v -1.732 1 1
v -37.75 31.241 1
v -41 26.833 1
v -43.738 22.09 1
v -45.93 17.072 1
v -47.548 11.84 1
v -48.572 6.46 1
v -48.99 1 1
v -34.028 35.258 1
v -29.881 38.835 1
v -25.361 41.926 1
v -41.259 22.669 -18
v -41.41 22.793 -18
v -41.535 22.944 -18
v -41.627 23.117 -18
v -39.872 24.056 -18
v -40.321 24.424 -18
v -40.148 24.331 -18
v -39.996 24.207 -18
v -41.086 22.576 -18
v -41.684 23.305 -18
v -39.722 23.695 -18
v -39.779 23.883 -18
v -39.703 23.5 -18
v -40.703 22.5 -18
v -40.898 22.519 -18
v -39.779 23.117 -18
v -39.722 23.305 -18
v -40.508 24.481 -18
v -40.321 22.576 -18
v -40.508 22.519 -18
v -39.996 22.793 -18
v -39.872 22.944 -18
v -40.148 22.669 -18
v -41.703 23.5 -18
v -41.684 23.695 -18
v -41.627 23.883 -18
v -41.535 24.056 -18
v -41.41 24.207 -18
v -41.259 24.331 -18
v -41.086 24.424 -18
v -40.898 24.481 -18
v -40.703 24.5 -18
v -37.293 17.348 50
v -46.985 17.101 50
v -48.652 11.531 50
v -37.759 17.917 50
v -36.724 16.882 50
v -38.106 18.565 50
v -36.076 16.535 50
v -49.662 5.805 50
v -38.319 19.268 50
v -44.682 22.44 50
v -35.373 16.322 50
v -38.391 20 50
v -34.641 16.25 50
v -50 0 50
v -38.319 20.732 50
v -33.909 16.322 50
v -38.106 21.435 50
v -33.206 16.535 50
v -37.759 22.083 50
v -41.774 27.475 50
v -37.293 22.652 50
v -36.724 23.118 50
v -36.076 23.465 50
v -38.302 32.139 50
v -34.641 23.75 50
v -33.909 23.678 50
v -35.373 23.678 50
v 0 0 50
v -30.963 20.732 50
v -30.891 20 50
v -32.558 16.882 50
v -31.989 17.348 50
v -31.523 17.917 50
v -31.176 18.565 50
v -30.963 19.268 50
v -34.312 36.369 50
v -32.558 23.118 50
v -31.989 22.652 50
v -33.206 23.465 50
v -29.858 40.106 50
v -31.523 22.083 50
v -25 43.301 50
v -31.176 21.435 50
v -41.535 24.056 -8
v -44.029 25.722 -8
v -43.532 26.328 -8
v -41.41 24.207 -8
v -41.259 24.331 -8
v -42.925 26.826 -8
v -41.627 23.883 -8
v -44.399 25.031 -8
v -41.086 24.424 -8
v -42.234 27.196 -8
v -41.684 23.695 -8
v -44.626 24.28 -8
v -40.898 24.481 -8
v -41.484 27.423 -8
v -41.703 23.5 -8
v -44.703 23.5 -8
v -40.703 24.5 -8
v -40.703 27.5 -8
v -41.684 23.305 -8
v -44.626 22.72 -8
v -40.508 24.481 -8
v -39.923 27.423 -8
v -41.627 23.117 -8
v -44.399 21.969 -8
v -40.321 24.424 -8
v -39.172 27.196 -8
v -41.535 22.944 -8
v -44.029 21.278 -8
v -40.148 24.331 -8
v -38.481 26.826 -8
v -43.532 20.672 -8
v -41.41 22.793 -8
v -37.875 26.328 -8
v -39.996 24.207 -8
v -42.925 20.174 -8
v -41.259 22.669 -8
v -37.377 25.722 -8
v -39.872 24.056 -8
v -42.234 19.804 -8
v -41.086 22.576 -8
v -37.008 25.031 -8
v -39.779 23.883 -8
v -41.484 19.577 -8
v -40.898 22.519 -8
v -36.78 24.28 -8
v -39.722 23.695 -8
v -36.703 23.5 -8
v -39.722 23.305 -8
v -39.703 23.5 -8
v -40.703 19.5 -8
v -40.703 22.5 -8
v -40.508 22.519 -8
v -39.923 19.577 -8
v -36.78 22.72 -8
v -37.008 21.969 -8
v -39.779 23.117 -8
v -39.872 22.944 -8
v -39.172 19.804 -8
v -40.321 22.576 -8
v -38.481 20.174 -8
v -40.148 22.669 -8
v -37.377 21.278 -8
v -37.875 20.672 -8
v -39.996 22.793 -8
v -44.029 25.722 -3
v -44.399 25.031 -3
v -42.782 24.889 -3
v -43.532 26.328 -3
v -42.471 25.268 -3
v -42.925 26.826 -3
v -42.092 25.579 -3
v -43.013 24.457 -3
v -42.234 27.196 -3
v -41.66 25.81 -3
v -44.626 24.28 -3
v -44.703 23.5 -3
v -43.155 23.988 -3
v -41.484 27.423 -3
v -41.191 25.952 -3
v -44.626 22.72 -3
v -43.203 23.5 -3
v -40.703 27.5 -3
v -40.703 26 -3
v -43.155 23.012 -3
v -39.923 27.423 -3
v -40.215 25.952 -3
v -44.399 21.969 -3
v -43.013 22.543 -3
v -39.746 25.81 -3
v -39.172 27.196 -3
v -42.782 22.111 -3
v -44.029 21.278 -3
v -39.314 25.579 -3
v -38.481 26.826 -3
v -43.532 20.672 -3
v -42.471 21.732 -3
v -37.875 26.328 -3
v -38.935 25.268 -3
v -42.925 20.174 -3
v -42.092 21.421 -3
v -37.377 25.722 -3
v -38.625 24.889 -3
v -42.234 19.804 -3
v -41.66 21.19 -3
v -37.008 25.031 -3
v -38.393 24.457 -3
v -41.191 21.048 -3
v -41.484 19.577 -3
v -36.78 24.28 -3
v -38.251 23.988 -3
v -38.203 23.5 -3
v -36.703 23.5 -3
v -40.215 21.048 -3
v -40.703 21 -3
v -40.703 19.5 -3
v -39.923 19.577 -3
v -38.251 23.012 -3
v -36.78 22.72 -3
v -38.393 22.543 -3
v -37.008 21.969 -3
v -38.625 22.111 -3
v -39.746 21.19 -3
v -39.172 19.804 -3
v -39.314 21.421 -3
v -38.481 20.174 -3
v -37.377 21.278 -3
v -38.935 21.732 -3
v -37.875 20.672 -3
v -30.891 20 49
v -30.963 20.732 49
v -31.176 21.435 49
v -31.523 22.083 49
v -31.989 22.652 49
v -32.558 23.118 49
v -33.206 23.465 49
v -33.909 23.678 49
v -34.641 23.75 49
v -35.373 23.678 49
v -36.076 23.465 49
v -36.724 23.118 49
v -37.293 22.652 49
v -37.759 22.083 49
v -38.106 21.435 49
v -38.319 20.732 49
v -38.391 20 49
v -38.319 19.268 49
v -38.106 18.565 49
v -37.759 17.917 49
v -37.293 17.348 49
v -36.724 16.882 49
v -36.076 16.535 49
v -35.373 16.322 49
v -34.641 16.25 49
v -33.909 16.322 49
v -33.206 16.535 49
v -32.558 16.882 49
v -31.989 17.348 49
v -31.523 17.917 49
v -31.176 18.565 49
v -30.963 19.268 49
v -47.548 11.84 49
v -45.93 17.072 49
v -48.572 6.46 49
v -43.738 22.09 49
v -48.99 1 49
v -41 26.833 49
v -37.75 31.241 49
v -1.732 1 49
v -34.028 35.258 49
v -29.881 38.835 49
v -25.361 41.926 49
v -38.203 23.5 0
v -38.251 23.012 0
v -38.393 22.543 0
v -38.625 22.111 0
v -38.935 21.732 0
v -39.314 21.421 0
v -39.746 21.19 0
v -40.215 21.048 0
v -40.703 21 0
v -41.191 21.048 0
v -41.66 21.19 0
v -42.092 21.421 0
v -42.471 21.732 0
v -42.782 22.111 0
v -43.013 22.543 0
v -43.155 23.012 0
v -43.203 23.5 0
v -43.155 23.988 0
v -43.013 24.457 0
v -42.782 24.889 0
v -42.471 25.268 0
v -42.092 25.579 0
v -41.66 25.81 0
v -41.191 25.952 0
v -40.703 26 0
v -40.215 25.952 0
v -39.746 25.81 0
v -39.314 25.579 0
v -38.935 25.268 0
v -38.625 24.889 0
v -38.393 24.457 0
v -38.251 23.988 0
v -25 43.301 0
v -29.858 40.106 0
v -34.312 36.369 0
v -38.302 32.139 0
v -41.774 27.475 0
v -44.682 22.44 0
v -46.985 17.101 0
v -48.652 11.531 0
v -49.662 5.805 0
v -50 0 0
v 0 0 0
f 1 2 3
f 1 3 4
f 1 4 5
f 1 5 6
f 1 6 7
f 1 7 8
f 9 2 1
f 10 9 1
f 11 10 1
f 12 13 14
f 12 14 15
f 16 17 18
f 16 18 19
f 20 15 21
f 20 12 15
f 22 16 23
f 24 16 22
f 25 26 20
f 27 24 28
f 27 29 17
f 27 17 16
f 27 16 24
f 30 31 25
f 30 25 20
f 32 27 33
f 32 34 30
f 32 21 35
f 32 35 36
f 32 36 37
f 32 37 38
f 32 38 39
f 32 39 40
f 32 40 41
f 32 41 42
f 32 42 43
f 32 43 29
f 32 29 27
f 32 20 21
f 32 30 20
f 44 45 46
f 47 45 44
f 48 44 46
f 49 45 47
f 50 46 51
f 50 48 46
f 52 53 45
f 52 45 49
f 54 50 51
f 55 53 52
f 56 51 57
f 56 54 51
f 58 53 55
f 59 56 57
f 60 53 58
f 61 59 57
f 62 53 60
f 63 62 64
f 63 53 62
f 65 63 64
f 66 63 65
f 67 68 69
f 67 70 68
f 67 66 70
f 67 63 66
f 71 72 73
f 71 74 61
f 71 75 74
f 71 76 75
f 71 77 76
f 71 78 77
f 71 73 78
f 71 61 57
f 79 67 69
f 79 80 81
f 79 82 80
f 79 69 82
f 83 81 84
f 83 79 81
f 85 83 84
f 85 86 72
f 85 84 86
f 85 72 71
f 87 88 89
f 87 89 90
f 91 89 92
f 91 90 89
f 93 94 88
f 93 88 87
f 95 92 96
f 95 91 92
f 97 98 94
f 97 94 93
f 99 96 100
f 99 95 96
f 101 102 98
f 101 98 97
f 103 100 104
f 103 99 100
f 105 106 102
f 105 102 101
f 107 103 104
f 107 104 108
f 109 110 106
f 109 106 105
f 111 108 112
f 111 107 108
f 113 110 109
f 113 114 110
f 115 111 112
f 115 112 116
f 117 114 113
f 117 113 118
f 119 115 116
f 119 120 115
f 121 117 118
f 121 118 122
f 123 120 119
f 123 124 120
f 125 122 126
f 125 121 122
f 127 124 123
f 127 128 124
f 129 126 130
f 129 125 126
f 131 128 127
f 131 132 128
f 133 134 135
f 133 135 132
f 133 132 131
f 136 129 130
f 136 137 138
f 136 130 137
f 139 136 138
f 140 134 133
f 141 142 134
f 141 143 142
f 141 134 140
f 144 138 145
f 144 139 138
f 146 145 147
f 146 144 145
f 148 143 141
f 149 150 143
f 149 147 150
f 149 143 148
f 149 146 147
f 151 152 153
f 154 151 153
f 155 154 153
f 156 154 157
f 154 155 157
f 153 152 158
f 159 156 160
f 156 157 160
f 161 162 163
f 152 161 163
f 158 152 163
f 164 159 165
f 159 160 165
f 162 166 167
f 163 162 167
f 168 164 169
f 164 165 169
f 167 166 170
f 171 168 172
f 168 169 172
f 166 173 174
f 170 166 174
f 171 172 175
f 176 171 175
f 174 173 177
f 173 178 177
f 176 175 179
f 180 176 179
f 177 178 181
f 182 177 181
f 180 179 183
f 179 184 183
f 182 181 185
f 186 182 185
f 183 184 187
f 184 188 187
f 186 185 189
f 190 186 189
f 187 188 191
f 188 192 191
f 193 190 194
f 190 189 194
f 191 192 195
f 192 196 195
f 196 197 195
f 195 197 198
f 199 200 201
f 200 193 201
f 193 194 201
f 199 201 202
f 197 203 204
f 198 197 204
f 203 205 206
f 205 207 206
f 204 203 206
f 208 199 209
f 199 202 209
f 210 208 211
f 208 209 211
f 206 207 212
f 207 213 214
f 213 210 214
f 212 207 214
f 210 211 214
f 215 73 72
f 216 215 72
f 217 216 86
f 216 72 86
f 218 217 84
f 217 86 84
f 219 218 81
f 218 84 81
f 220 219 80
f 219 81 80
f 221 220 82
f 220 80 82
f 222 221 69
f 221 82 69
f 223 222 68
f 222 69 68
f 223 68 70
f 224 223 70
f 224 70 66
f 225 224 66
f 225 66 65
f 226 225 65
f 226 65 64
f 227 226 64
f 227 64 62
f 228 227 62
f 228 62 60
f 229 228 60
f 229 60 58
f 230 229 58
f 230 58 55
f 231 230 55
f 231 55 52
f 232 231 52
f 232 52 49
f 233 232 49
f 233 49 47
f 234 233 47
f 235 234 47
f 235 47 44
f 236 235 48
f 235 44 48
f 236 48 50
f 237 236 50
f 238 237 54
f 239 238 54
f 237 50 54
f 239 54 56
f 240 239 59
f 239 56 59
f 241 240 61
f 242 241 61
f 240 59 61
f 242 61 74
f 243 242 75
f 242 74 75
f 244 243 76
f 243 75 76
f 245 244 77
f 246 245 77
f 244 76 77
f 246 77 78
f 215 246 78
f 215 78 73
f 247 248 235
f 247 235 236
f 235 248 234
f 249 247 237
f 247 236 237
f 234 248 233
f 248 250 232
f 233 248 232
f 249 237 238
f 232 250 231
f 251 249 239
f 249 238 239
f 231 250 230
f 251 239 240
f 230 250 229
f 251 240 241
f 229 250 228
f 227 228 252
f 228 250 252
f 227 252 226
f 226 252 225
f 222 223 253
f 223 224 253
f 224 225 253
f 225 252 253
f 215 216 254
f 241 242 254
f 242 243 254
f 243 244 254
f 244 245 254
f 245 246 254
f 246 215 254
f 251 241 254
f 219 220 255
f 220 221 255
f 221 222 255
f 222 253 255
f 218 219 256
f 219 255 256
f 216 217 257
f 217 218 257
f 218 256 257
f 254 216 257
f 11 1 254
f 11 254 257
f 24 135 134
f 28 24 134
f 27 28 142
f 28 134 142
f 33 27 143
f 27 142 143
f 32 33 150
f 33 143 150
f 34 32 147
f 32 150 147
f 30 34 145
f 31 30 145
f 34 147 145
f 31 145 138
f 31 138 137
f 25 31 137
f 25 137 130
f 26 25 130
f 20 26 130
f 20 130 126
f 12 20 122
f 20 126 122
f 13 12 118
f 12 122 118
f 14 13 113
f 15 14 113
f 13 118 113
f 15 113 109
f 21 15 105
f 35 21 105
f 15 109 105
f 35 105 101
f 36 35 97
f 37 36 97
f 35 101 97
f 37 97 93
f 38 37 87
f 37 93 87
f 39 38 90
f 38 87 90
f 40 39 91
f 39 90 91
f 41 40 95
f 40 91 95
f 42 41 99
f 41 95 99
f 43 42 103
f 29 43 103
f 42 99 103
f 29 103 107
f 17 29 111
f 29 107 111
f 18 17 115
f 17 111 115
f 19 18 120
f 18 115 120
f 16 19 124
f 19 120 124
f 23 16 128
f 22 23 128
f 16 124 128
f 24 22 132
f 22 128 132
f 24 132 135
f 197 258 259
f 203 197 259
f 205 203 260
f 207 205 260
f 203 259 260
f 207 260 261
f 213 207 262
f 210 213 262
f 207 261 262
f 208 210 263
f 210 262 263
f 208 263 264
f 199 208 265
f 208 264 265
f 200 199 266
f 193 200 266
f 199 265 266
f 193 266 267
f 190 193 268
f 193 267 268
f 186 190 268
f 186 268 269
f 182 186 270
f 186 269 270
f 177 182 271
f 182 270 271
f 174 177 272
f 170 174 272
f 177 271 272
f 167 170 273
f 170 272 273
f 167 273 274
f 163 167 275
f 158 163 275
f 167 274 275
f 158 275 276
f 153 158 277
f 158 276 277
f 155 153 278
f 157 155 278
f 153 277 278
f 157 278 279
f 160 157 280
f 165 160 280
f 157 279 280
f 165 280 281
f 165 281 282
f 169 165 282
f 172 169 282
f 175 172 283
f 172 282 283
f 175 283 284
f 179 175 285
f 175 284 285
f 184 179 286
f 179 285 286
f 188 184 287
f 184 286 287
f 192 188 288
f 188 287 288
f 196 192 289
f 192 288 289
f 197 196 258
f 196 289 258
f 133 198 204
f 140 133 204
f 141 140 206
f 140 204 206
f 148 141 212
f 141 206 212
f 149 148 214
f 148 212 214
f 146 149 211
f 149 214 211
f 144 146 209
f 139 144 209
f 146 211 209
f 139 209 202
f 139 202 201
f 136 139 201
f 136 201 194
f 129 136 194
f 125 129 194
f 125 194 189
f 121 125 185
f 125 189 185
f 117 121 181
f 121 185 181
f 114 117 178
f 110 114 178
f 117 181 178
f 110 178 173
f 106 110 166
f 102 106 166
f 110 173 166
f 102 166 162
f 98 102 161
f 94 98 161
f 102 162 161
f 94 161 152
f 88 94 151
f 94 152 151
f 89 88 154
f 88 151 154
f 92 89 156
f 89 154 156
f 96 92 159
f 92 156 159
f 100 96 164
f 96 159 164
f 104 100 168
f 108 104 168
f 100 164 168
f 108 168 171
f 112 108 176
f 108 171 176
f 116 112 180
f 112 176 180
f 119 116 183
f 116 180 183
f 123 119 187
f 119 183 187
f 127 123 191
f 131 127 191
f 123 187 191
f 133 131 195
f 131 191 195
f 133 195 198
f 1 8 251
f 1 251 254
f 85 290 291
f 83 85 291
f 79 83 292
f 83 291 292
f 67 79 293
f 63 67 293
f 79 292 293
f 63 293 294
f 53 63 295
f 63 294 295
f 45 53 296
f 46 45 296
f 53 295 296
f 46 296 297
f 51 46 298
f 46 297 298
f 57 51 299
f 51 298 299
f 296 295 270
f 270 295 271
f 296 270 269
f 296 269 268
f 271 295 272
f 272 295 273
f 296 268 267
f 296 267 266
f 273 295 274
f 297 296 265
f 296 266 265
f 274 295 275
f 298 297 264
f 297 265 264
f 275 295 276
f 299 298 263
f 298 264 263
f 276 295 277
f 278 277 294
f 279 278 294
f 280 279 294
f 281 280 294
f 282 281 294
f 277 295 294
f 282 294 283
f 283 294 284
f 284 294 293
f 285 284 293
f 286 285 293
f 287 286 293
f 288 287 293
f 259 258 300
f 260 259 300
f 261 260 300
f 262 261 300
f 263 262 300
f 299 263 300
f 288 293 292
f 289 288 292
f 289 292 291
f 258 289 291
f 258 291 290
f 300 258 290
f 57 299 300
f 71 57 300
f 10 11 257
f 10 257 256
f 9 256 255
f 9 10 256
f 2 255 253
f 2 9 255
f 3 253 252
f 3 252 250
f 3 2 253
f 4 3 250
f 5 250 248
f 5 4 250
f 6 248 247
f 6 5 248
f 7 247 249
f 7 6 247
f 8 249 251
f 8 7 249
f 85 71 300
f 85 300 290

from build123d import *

# Parameters (mm, degrees)
F1_DEPTH  = 50
F3_START  = 1
F3_DEPTH  = 48
F4_R      = 2.5
F5_DEPTH  = 3
F6_R      = 4
F7_DEPTH  = 5
F8_R      = 1
F9_DEPTH  = 10
F10_R     = 3.75
F11_DEPTH = 2


with BuildPart() as f1:
    # F0 (on Top) → F1 (new body)
    with BuildSketch(Plane.XY):
        with BuildLine():
            Line((0, 0), (-25, 43.3012701892))
            ThreePointArc((-25, 43.3012701892), (-43.3012701892, 25), (-50, 0))
            Line((-50, 0), (0, 0))
        make_face()
    extrude(amount=F1_DEPTH)

    # F2 (on Top) → F3 (cut)
    with BuildSketch(Plane.XY.offset(F3_START)):
        with BuildLine():
            Line((-1.7320508076, 1), (-25.3609228316, 41.9264068712))
            ThreePointArc((-25.3609228316, 41.9264068712), (-42.4352447854, 24.5), (-48.9897948557, 1))
            Line((-48.9897948557, 1), (-1.7320508076, 1))
        make_face()
    extrude(amount=F3_DEPTH, mode=Mode.SUBTRACT)

    # F4 (on face) → F5 (join)
    with BuildSketch(Plane(origin=(0, 0, 0), x_dir=(1, 0, 0), z_dir=(0, 0, -1))):
        with Locations((-40.7031939779, -23.5)):
            Circle(F4_R)
    extrude(amount=F5_DEPTH)

    # F6 (on face) → F7 (join)
    with BuildSketch(Plane(origin=(0, 0, -3), x_dir=(1, 0, 0), z_dir=(0, 0, -1))):
        with Locations((-40.7031939779, -23.5)):
            Circle(F6_R)
    extrude(amount=F7_DEPTH)

    # F8 (on face) → F9 (join)
    with BuildSketch(Plane(origin=(0, 0, -8), x_dir=(1, 0, 0), z_dir=(0, 0, -1))):
        with Locations((-40.7031939779, -23.5)):
            Circle(F8_R)
    extrude(amount=F9_DEPTH)

    # F10 (on face) → F11 (cut)
    with BuildSketch(Plane.XY.offset(50)):
        with Locations((-34.6410161514, 20)):
            Circle(F10_R)
    extrude(amount=-F11_DEPTH, mode=Mode.SUBTRACT)


solid = f1.part
